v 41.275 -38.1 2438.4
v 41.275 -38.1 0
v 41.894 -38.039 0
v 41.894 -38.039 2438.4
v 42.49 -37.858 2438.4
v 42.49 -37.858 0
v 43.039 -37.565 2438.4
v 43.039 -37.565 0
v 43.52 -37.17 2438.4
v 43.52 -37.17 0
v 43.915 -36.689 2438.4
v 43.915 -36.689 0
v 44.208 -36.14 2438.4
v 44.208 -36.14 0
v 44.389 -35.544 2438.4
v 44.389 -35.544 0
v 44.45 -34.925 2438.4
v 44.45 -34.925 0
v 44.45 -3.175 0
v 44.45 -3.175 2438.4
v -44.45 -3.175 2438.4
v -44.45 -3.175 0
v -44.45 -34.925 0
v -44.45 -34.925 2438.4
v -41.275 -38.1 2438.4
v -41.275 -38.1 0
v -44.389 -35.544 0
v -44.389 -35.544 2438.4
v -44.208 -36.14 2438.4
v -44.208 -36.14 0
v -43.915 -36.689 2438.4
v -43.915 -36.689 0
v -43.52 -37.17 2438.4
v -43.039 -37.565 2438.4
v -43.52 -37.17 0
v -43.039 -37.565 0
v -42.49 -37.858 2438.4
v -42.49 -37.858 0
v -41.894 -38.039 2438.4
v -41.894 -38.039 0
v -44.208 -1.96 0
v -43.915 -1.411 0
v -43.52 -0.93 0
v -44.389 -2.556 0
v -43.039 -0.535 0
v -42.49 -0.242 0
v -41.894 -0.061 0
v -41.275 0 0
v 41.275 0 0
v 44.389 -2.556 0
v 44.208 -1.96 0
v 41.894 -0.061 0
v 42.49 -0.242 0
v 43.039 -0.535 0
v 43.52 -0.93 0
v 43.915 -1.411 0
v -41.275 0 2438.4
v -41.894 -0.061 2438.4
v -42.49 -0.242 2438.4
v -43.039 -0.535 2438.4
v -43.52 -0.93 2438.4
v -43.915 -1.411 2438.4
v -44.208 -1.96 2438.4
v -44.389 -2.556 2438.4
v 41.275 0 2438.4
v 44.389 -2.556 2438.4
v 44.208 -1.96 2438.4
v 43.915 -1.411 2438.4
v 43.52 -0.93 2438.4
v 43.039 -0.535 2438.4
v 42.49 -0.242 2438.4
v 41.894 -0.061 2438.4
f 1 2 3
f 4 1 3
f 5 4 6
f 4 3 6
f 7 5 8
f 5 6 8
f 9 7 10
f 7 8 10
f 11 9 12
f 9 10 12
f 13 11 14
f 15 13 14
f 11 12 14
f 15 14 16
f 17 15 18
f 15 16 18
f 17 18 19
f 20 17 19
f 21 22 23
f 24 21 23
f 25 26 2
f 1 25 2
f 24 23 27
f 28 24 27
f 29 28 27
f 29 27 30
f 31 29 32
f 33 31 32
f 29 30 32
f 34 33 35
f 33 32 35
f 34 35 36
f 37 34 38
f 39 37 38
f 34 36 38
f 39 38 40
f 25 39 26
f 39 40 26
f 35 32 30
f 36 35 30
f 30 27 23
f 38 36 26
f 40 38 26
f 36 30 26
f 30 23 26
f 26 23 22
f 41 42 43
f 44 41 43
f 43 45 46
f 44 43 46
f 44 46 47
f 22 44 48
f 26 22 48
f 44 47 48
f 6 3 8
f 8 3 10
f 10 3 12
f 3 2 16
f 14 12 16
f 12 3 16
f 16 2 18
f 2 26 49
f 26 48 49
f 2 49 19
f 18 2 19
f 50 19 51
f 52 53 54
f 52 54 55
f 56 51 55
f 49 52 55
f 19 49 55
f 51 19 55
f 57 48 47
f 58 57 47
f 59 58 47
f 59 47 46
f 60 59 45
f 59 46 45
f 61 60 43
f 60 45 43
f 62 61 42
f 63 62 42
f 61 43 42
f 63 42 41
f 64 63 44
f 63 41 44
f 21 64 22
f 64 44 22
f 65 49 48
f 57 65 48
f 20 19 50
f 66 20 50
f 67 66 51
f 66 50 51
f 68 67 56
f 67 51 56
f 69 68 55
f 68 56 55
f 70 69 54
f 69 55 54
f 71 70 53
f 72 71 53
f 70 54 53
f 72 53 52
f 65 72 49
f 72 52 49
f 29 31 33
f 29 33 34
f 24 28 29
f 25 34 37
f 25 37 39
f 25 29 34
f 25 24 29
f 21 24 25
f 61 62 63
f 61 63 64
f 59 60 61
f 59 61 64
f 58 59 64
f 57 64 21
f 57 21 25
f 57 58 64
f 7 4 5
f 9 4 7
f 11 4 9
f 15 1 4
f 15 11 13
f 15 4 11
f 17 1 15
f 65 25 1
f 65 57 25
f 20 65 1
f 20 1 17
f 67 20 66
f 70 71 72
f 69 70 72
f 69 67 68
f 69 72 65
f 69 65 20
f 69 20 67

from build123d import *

# Parameters (mm, degrees)
F1_DEPTH = 2438.4


with BuildPart() as f1:
    # F0 (on Top) → F1 (new body)
    with BuildSketch(Plane.XY):
        with BuildLine():
            Line((-61.6295757718, 13.413597323), (-144.1795757718, 13.413597323))
            ThreePointArc((-144.1795757718, 13.413597323), (-146.4246398021, 12.4836613533), (-147.3545757718, 10.238597323))
            Line((-147.3545757718, 10.238597323), (-147.3545757718, -21.511402677))
            ThreePointArc((-147.3545757718, -21.511402677), (-146.4246398021, -23.7564667073), (-144.1795757718, -24.686402677))
            Line((-144.1795757718, -24.686402677), (-61.6295757718, -24.686402677))
            ThreePointArc((-61.6295757718, -24.686402677), (-59.3845117415, -23.7564667073), (-58.4545757718, -21.511402677))
            Line((-58.4545757718, -21.511402677), (-58.4545757718, 10.238597323))
            ThreePointArc((-58.4545757718, 10.238597323), (-59.3845117415, 12.4836613533), (-61.6295757718, 13.413597323))
        make_face()
    extrude(amount=F1_DEPTH)


with BuildPart() as f1_1:
    # F3: moved
    add(f1.part.moved(Location((102.9045757718, -13.413597323, 0))))


solid = f1_1.part
